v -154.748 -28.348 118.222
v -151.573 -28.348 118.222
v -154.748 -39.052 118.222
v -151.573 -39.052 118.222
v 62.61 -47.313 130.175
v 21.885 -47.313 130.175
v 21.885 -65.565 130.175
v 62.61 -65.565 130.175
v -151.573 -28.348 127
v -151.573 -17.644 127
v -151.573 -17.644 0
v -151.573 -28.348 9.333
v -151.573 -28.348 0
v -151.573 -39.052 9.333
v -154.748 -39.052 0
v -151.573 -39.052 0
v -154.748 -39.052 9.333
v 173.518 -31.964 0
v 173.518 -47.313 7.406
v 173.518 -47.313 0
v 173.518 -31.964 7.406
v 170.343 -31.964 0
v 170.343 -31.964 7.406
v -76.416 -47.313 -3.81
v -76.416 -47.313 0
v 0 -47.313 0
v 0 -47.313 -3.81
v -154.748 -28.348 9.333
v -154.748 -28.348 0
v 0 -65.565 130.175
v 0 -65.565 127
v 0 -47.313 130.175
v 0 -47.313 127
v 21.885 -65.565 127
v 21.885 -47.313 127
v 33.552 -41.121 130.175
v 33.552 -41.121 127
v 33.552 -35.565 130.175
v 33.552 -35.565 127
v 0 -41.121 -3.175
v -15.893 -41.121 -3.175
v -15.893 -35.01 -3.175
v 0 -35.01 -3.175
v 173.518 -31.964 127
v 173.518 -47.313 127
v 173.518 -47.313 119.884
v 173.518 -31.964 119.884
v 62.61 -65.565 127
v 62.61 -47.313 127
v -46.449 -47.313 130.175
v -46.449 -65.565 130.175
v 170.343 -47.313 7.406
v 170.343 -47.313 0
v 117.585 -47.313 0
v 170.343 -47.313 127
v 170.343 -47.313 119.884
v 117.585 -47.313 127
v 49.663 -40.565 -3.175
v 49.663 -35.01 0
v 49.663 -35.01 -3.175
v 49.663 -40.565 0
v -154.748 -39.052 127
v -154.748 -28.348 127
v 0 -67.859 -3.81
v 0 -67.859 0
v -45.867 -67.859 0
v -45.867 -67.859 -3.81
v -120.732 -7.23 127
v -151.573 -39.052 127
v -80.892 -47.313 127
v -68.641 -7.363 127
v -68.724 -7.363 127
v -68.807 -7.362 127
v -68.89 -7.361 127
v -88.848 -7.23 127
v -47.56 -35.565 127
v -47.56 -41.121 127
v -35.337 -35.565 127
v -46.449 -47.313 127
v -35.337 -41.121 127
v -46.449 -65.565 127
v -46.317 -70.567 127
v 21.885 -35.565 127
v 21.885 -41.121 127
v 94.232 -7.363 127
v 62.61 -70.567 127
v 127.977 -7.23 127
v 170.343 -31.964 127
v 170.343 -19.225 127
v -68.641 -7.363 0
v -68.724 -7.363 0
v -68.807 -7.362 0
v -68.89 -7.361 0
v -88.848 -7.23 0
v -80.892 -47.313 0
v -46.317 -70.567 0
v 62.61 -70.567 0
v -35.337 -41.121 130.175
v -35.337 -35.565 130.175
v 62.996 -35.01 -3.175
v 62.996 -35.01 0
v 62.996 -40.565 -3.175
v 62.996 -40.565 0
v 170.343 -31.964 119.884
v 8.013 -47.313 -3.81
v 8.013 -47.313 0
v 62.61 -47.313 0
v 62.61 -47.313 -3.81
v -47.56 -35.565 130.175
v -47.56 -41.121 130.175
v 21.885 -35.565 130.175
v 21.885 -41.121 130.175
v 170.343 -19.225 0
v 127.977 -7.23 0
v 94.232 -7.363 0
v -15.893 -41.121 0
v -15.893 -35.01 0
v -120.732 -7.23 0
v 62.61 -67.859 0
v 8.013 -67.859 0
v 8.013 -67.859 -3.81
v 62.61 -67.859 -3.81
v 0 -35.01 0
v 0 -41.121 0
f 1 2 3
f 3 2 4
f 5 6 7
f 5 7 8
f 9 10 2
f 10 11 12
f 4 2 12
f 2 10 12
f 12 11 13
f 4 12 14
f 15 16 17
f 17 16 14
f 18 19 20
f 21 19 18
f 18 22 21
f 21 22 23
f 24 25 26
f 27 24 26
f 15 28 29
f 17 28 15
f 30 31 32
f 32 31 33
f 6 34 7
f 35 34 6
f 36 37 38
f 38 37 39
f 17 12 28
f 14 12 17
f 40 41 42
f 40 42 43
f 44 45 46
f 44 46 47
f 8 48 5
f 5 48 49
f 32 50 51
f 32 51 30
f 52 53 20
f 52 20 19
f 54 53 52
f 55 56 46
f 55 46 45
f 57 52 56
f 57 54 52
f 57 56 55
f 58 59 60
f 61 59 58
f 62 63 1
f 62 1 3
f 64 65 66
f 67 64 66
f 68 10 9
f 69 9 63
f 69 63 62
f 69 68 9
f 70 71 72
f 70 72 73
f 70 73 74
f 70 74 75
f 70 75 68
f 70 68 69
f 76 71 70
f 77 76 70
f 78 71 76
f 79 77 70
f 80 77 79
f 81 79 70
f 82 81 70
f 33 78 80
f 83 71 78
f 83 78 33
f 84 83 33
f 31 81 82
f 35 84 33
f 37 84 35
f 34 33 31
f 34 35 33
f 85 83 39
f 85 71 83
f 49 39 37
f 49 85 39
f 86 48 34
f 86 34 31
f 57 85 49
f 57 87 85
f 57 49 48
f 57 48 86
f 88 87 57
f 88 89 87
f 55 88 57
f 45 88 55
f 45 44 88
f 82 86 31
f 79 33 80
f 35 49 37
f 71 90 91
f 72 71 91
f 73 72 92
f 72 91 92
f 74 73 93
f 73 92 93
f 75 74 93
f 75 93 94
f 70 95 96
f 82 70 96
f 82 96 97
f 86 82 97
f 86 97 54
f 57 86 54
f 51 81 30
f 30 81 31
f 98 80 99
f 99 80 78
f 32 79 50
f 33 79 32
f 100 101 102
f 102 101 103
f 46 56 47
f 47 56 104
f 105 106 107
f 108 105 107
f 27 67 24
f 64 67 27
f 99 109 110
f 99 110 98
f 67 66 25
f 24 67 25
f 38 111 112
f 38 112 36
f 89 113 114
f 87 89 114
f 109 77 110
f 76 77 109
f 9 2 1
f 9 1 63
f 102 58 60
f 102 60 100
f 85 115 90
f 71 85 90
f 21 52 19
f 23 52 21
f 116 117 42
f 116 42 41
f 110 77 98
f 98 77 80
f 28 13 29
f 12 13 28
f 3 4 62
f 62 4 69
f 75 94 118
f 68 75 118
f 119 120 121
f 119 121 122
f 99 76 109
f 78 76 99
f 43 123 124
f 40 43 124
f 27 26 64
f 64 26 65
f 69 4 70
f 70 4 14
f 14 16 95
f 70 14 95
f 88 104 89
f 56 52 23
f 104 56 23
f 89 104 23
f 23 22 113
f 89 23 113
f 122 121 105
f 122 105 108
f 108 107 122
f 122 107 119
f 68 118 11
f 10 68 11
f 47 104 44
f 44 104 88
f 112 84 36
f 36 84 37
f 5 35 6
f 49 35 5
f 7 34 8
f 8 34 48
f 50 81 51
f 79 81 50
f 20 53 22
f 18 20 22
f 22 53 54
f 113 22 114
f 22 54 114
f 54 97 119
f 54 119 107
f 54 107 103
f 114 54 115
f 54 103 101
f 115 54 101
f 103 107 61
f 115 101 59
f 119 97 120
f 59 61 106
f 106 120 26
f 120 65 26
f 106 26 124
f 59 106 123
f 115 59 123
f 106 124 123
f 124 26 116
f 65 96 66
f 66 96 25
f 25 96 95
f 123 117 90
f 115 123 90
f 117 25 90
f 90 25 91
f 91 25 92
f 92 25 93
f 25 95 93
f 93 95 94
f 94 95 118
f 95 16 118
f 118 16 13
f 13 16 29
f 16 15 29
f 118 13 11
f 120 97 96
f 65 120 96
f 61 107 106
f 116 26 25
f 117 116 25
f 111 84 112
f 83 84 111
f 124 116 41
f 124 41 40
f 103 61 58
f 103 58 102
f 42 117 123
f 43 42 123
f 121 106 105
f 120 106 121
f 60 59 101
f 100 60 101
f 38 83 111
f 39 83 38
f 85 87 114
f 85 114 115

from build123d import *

# Parameters (mm, degrees)
F5_DEPTH  = 127
F6_W      = 54.5970508829
F6_H      = 20.5464081178
F7_DEPTH  = 3.81
F8_W      = 15.3487510979
F8_H      = 7.4063618667
F8_H_2    = 7.1164776087
F9_DEPTH  = 3.175
F10_W     = 10.7039126975
F10_H     = 8.7776441574
F10_H_2   = 9.3331737444
F11_DEPTH = 3.175
F12_W     = 40.7254230231
F12_H     = 18.2523988187
F12_W_2   = 46.4485138655
F13_DEPTH = 3.175
F14_W     = 15.8928539604
F14_H     = 6.1111226678
F14_W_2   = 13.3333727717
F14_H_2   = 5.5555664003
F15_DEPTH = 3.175
F16_W     = 11.666694656
F16_H     = 5.5555701256
F16_W_2   = 12.222263962
F17_DEPTH = 3.175


# Not quite as in the source:
# - the program builds the solid bodies; features that only make, move or delete a surface that nothing else refers to are left out


with BuildPart() as f5:
    # F0 (on Top) → F5 (new body)
    with BuildSketch(Plane.XY):
        with BuildLine():
            Line((94.2318475405, -7.3630477542), (-68.6407278484, -7.3630477542))
            ThreePointArc((-68.6407278484, -7.3630477542), (-68.7653713247, -7.3626377944), (-68.8900094076, -7.3614079328))
            Line((-68.8900094076, -7.3614079328), (-88.84768188, -7.2301225737))
            Line((-88.84768188, -7.2301225737), (-120.7322572041, -7.2301225737))
            Line((-120.7322572041, -7.2301225737), (-151.5727639198, -17.6438004827))
            Line((-151.5727639198, -17.6438004827), (-151.5727639198, -39.0516258776))
            Line((-151.5727639198, -39.0516258776), (-80.8923020959, -47.3129786551))
            Line((-80.8923020959, -47.3129786551), (-46.3170148432, -70.5671533942))
            Line((-46.3170148432, -70.5671533942), (62.6104325056, -70.5671533942))
            Line((62.6104325056, -70.5671533942), (117.5853461027, -47.3129786551))
            Line((117.5853461027, -47.3129786551), (170.3427284956, -47.3129786551))
            Line((170.3427284956, -47.3129786551), (170.3427284956, -19.2245114595))
            Line((170.3427284956, -19.2245114595), (127.9769688845, -7.2301225737))
            Line((127.9769688845, -7.2301225737), (94.2318475405, -7.3630477542))
        make_face()
    extrude(amount=F5_DEPTH)

    # F6 (on face) → F7 (join)
    with BuildSketch(Plane(origin=(0, 0, 0), x_dir=(1, 0, 0), z_dir=(0, 0, -1))):
        Polygon((-45.8669510931, 67.8593867729), (-76.4162167907, 47.3129786551), (0, 47.3129786551), (0, 67.8593867729), align=None)
        with Locations((35.3119070642, 57.586182714)):
            Rectangle(F6_W, F6_H)
    extrude(amount=F7_DEPTH)

    # F8 (on face) → F9 (join)
    with BuildSketch(Plane.YZ.offset(170.3427284956)):
        with Locations((-39.6386031061, 3.7031809334)):
            Rectangle(F8_W, F8_H)
        with Locations((-39.6386031061, 123.4417611957)):
            Rectangle(F8_W, F8_H_2)
    extrude(amount=F9_DEPTH)

    # F10 (on face) → F11 (join)
    with BuildSketch(Plane(origin=(-151.5727639198, 0, 0), x_dir=(0, -1, 0), z_dir=(-1, 0, 0))):
        with Locations((33.6996695289, 122.6111779213)):
            Rectangle(F10_W, F10_H)
        with Locations((33.6996695289, 4.6665868722)):
            Rectangle(F10_W, F10_H_2)
    extrude(amount=F11_DEPTH)

    # F12 (on face) → F13 (join)
    with BuildSketch(Plane.XY.offset(127)):
        with Locations((42.2477209941, -56.4391780645)):
            Rectangle(F12_W, F12_H)
        with Locations((-23.2242569327, -56.4391780645)):
            Rectangle(F12_W_2, F12_H)
    extrude(amount=F13_DEPTH)

    # F14 (on face) → F15 (join)
    with BuildSketch(Plane(origin=(0, 0, 0), x_dir=(1, 0, 0), z_dir=(0, 0, -1))):
        with Locations((-7.9464269802, 38.065303117)):
            Rectangle(F14_W, F14_H)
        with Locations((56.3295595348, 37.7875249833)):
            Rectangle(F14_W_2, F14_H_2)
    extrude(amount=F15_DEPTH)

    # F16 (on face) → F17 (join)
    with BuildSketch(Plane.XY.offset(127)):
        with Locations((27.7183568105, -38.3430793881)):
            Rectangle(F16_W, F16_H)
        with Locations((-41.4484944195, -38.3430793881)):
            Rectangle(F16_W_2, F16_H)
    extrude(amount=F17_DEPTH)


solid = f5.part
